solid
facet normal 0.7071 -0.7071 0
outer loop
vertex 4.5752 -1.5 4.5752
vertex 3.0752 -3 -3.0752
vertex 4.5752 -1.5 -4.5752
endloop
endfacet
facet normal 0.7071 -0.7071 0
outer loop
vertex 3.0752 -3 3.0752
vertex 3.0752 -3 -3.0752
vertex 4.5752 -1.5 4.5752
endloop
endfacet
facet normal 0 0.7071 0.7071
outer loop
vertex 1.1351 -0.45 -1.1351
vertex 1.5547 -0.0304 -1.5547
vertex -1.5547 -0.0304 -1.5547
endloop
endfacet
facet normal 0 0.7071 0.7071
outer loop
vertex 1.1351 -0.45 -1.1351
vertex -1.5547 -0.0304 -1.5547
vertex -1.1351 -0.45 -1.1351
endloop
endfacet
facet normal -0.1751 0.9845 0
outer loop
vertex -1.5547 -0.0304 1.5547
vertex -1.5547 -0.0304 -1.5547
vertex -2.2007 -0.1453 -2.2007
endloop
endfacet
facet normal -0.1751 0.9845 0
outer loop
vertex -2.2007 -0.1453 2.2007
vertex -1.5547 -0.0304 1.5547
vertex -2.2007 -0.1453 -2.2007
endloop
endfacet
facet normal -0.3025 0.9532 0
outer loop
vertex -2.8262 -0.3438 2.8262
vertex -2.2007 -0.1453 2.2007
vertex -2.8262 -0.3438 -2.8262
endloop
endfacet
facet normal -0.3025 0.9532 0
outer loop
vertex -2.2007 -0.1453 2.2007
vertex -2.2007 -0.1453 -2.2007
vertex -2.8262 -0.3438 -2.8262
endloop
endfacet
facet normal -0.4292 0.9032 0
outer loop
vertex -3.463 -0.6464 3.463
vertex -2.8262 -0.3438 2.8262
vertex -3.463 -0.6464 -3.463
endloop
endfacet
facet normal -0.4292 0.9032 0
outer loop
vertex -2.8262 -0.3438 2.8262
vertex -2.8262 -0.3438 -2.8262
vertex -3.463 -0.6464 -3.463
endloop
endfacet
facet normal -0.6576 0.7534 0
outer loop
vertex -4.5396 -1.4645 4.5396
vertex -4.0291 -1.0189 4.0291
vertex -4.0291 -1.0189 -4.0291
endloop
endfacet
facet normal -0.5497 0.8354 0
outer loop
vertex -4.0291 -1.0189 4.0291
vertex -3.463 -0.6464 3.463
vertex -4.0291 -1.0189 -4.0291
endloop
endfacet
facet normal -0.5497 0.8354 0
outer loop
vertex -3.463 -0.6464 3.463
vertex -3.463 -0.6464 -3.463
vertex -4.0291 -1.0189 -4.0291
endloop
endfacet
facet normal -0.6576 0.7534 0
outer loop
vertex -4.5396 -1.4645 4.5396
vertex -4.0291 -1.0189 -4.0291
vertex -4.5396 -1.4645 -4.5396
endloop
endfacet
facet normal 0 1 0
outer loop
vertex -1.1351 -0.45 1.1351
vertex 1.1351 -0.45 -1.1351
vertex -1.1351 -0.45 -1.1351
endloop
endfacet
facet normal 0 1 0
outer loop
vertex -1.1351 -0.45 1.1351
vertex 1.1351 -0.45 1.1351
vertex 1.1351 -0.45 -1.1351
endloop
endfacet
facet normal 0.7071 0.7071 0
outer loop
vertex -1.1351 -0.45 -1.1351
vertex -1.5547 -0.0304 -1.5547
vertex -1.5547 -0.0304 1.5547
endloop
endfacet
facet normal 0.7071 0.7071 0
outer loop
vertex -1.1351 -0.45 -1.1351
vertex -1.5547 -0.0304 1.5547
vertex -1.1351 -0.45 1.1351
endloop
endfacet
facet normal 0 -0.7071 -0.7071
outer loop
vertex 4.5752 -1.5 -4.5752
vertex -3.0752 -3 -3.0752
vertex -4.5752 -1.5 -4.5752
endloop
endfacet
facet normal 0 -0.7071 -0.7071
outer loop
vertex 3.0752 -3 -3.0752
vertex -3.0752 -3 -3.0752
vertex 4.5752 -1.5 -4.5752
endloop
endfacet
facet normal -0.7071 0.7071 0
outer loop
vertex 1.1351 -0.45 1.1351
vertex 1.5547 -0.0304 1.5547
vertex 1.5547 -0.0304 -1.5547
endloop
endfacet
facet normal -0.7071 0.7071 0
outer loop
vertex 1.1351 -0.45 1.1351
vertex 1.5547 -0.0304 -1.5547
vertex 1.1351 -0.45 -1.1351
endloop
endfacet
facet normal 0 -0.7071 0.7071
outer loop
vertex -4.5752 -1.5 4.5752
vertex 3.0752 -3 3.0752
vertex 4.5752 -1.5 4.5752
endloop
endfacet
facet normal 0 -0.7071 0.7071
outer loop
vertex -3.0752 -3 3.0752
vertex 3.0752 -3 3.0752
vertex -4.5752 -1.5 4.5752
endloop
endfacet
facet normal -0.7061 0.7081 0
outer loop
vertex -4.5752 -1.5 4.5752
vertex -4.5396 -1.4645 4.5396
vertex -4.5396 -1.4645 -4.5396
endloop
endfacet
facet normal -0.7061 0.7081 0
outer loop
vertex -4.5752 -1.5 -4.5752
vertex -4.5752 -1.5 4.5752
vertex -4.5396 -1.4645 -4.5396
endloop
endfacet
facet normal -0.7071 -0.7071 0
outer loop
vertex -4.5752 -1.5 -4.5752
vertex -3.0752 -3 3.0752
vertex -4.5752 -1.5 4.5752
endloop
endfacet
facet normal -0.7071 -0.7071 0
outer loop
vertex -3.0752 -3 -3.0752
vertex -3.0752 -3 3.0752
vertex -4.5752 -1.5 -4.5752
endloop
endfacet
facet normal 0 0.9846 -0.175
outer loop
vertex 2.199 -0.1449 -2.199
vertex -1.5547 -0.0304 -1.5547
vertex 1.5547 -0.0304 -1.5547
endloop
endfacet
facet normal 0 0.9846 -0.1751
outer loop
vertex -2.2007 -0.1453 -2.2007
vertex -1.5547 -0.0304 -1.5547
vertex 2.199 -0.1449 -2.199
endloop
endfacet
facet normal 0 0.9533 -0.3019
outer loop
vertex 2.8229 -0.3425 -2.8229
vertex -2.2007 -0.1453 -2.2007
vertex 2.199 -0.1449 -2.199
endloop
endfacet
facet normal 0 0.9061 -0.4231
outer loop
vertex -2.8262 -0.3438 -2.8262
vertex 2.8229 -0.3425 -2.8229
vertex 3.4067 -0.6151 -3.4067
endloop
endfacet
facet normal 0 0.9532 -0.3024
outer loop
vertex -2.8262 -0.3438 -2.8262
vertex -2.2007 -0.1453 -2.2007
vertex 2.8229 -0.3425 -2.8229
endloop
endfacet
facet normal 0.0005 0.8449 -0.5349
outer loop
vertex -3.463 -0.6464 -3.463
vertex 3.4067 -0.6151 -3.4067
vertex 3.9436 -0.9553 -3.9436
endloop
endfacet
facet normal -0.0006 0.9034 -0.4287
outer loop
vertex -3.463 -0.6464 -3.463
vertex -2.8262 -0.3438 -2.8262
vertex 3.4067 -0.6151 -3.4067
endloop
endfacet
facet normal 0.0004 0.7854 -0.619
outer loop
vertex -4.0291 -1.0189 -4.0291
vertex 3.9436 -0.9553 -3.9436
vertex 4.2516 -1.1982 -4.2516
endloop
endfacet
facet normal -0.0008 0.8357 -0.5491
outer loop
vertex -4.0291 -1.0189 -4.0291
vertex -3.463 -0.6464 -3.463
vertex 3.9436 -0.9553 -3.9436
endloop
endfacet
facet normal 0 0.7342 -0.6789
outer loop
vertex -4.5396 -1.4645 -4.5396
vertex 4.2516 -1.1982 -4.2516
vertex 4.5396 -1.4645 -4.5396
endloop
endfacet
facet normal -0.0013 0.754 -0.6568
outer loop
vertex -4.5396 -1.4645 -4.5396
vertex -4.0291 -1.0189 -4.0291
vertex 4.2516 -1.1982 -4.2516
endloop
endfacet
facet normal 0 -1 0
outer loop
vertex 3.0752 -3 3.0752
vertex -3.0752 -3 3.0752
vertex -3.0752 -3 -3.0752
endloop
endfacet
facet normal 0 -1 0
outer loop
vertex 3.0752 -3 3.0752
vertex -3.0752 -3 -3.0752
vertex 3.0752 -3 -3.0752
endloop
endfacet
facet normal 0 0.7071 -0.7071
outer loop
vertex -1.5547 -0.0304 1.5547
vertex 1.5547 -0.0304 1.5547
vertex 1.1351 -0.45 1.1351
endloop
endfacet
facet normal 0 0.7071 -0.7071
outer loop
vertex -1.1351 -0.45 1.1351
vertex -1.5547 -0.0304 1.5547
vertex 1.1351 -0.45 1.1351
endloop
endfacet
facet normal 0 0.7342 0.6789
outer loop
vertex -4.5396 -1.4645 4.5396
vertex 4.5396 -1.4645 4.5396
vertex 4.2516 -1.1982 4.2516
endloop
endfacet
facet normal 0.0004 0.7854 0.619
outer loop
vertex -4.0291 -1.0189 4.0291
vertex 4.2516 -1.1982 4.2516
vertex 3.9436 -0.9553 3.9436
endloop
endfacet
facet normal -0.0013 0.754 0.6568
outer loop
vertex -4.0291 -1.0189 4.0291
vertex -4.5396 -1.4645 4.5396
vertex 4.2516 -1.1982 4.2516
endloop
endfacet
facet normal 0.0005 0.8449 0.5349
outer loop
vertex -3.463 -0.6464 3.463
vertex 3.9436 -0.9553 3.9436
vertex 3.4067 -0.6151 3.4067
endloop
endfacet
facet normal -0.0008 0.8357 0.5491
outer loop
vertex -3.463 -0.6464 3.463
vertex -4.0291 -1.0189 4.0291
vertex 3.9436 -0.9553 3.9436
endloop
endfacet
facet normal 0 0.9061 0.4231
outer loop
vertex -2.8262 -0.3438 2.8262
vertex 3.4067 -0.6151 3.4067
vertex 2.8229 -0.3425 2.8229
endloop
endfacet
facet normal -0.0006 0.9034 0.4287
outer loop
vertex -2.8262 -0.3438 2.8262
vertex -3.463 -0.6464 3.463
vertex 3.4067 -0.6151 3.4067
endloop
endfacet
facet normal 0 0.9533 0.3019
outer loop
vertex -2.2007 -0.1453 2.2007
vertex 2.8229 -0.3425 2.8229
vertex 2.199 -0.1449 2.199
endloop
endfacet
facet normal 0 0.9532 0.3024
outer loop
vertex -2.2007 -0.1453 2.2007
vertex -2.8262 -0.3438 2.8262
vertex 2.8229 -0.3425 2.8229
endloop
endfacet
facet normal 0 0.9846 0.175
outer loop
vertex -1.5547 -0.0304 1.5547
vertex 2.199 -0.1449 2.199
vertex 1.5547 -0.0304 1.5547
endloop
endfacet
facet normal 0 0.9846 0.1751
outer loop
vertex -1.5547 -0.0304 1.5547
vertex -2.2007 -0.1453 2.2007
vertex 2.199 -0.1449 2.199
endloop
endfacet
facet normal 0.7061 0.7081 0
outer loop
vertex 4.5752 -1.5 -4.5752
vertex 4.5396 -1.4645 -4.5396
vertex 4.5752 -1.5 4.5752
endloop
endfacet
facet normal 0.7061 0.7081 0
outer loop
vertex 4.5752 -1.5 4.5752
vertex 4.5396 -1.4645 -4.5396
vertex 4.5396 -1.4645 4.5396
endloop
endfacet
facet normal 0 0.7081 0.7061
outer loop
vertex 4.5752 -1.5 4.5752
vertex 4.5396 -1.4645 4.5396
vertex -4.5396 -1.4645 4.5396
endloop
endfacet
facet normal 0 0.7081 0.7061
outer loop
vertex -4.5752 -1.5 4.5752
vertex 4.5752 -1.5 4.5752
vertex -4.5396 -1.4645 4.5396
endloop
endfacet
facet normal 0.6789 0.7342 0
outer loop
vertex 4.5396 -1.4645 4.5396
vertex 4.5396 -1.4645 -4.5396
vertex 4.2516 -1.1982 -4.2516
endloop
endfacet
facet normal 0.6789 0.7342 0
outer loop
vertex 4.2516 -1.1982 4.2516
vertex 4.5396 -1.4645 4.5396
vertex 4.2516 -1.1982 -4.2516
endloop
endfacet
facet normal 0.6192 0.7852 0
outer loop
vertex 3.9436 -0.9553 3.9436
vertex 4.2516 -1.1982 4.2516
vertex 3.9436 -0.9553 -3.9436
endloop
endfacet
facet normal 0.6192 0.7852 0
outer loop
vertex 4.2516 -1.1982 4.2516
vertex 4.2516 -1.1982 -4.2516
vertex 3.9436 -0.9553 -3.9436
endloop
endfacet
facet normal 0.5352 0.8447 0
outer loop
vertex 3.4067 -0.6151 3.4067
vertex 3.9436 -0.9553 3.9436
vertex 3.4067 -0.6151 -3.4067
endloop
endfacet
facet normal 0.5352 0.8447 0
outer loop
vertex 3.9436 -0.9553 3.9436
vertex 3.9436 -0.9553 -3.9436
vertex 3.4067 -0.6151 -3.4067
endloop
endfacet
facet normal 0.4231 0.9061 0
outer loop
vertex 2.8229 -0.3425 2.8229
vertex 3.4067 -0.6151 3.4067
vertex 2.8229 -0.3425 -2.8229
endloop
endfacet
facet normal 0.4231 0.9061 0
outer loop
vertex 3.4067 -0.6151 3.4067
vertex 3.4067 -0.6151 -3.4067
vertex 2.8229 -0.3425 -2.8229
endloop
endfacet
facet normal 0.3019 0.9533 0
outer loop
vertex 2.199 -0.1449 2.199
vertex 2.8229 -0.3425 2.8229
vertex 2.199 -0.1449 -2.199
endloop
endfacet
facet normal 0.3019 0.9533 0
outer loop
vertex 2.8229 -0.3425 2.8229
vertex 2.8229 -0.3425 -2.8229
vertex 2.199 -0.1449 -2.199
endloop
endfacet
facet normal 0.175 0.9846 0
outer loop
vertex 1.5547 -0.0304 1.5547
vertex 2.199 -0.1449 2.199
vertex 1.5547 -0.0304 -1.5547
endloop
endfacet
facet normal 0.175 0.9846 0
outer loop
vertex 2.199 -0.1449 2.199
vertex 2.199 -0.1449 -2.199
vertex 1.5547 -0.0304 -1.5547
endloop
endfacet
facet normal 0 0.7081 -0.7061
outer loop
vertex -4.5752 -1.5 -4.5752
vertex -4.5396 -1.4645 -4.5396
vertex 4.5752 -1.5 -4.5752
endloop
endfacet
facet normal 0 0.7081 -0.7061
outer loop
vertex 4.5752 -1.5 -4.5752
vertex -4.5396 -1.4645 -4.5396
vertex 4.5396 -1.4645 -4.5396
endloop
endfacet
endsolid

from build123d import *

# Parameters (mm, degrees)
F1_DEPTH     = 3
F2_SIZE2     = 1.49999
F2_SIZE      = 1.49999
F3_W         = 1.7351090792
F3_H         = 1.7351090792
F4_DEPTH     = 0.45
F5_T4_DEPTH  = 3.4702181583
F5_T9_DEPTH  = 3.4702181583
F5_T14_DEPTH = 3.4702181583
F5_T19_DEPTH = 3.4702181583
F6_T1_DEPTH  = 16.5056825173
F6_T3_DEPTH  = 16.5056825173


# Not quite as in the source:
# - a fillet or chamfer that OpenCascade refuses, or shapes differently, is made with other operations: its cross-section is extruded or revolved along the edge and cut away or added
# - a fillet or chamfer is up to 0.001 mm smaller than in the source, because OpenCascade refuses the exact size


with BuildPart() as f1:
    # F0 (on Front) → F1 (new body)
    with BuildSketch(Plane.XZ):
        Polygon((4.575161729, 4.575161729), (0, 4.575161729), (-4.575161729, 4.575161729), (-4.575161729, 0), (-4.575161729, -4.575161729), (0, -4.575161729), (4.575161729, -4.575161729), (4.575161729, 0), align=None)
    extrude(amount=F1_DEPTH)

    # F2 (size 1.5 and 1.5 in the source; OpenCascade refuses exactly that, so slightly less here)
    f2_edges = [f1.edges().sort_by_distance(p)[0] for p in [
        (0, -3, 4.575162),
        (-4.575162, -3, 0),
        (0, -3, -4.575162),
        (4.575162, -3, 0),
        (0, 0, 4.575162),
        (-4.575162, 0, 0),
        (0, 0, -4.575162),
        (4.575162, 0, 0),
    ]]
    chamfer(f2_edges, length=F2_SIZE, length2=F2_SIZE2)

    # F3 (on face) → F4 (cut)
    with BuildSketch(Plane(origin=(0, 0, 0), x_dir=(-1, 0, 0), z_dir=(0, 1, 0))):
        Polygon((0, 1.7351090792), (0, 0), (-1.7351090792, 0), (-1.7351090792, -1.7351090792), (0, -1.7351090792), (1.7351090792, -1.7351090792), (1.7351090792, 0), (1.7351090792, 1.7351090792), align=None)
        with Locations((-0.8675545396, 0.8675545396)):
            Rectangle(F3_W, F3_H)
    extrude(amount=-F4_DEPTH, mode=Mode.SUBTRACT)

    # F5: chamfer of 0.6 on 4 edges, made by hand


with BuildPart() as f5_tool2:
    # F5_s3 → F5_t4 (new body)
    with BuildSketch(Plane.YZ.offset(-1.7351090792)):
        Polygon((0.15, 1.7351090792), (-0.45, 1.1351090792), (-0.45, 1.7351090792), align=None)
    extrude(amount=F5_T4_DEPTH)

    split(bisect_by=Plane.XZ, keep=Keep.TOP)


with BuildPart() as f1_1:
    add(f1.part)

    # F5_t1: union F5_tool2
    add(f5_tool2.part)


with BuildPart() as f5_tool7:
    # F5_s8 → F5_t9 (new body)
    with BuildSketch(Plane.XY.offset(1.7351090792)):
        Polygon((1.7351090792, 0.15), (1.1351090792, -0.45), (1.7351090792, -0.45), align=None)
    extrude(amount=-F5_T9_DEPTH)

    split(bisect_by=Plane.XZ, keep=Keep.TOP)


with BuildPart() as f1_2:
    add(f1_1.part)

    # F5_t6: union F5_tool7
    add(f5_tool7.part)


with BuildPart() as f5_tool12:
    # F5_s13 → F5_t14 (new body)
    with BuildSketch(Plane.YZ.offset(1.7351090792)):
        Polygon((0.15, -1.7351090792), (-0.45, -1.1351090792), (-0.45, -1.7351090792), align=None)
    extrude(amount=-F5_T14_DEPTH)

    split(bisect_by=Plane.XZ, keep=Keep.TOP)


with BuildPart() as f1_3:
    add(f1_2.part)

    # F5_t11: union F5_tool12
    add(f5_tool12.part)


with BuildPart() as f5_tool17:
    # F5_s18 → F5_t19 (new body)
    with BuildSketch(Plane.XY.offset(-1.7351090792)):
        Polygon((-1.7351090792, 0.15), (-1.1351090792, -0.45), (-1.7351090792, -0.45), align=None)
    extrude(amount=F5_T19_DEPTH)

    split(bisect_by=Plane.XZ, keep=Keep.TOP)


with BuildPart() as f1_4:
    add(f1_3.part)

    # F5_t16: union F5_tool17
    add(f5_tool17.part)

    # F6: fillet of radius 5 on 4 edges, made by hand

    # F6_s2 → F6_t1 (cut)
    with BuildSketch(Plane.XY.offset(-8.2528412587)):
        with BuildLine():
            ThreePointArc((4.5396378231, -1.4644660941), (2.917521079, -0.3806023374), (1.0041039171, 0))
            Line((1.0041039171, 0), (3.075171729, 0))
            Line((3.075171729, 0), (4.5396378231, -1.4644660941))
        make_face()
        with BuildLine():
            ThreePointArc((-1.0041039171, 0), (-2.917521079, -0.3806023374), (-4.5396378231, -1.4644660941))
            Line((-4.5396378231, -1.4644660941), (-3.075171729, 0))
            Line((-3.075171729, 0), (-1.0041039171, 0))
        make_face()
    extrude(amount=F6_T1_DEPTH, mode=Mode.SUBTRACT)

    # F6_s4 → F6_t3 (cut)
    with BuildSketch(Plane.YZ.offset(-8.2528412587)):
        with BuildLine():
            ThreePointArc((-1.4644660941, 4.5396378231), (-0.3806023374, 2.917521079), (0, 1.0041039171))
            Line((0, 1.0041039171), (0, 3.075171729))
            Line((0, 3.075171729), (-1.4644660941, 4.5396378231))
        make_face()
        with BuildLine():
            ThreePointArc((0, -1.0041039171), (-0.3806023374, -2.917521079), (-1.4644660941, -4.5396378231))
            Line((-1.4644660941, -4.5396378231), (0, -3.075171729))
            Line((0, -3.075171729), (0, -1.0041039171))
        make_face()
    extrude(amount=F6_T3_DEPTH, mode=Mode.SUBTRACT)


solid = f1_4.part
